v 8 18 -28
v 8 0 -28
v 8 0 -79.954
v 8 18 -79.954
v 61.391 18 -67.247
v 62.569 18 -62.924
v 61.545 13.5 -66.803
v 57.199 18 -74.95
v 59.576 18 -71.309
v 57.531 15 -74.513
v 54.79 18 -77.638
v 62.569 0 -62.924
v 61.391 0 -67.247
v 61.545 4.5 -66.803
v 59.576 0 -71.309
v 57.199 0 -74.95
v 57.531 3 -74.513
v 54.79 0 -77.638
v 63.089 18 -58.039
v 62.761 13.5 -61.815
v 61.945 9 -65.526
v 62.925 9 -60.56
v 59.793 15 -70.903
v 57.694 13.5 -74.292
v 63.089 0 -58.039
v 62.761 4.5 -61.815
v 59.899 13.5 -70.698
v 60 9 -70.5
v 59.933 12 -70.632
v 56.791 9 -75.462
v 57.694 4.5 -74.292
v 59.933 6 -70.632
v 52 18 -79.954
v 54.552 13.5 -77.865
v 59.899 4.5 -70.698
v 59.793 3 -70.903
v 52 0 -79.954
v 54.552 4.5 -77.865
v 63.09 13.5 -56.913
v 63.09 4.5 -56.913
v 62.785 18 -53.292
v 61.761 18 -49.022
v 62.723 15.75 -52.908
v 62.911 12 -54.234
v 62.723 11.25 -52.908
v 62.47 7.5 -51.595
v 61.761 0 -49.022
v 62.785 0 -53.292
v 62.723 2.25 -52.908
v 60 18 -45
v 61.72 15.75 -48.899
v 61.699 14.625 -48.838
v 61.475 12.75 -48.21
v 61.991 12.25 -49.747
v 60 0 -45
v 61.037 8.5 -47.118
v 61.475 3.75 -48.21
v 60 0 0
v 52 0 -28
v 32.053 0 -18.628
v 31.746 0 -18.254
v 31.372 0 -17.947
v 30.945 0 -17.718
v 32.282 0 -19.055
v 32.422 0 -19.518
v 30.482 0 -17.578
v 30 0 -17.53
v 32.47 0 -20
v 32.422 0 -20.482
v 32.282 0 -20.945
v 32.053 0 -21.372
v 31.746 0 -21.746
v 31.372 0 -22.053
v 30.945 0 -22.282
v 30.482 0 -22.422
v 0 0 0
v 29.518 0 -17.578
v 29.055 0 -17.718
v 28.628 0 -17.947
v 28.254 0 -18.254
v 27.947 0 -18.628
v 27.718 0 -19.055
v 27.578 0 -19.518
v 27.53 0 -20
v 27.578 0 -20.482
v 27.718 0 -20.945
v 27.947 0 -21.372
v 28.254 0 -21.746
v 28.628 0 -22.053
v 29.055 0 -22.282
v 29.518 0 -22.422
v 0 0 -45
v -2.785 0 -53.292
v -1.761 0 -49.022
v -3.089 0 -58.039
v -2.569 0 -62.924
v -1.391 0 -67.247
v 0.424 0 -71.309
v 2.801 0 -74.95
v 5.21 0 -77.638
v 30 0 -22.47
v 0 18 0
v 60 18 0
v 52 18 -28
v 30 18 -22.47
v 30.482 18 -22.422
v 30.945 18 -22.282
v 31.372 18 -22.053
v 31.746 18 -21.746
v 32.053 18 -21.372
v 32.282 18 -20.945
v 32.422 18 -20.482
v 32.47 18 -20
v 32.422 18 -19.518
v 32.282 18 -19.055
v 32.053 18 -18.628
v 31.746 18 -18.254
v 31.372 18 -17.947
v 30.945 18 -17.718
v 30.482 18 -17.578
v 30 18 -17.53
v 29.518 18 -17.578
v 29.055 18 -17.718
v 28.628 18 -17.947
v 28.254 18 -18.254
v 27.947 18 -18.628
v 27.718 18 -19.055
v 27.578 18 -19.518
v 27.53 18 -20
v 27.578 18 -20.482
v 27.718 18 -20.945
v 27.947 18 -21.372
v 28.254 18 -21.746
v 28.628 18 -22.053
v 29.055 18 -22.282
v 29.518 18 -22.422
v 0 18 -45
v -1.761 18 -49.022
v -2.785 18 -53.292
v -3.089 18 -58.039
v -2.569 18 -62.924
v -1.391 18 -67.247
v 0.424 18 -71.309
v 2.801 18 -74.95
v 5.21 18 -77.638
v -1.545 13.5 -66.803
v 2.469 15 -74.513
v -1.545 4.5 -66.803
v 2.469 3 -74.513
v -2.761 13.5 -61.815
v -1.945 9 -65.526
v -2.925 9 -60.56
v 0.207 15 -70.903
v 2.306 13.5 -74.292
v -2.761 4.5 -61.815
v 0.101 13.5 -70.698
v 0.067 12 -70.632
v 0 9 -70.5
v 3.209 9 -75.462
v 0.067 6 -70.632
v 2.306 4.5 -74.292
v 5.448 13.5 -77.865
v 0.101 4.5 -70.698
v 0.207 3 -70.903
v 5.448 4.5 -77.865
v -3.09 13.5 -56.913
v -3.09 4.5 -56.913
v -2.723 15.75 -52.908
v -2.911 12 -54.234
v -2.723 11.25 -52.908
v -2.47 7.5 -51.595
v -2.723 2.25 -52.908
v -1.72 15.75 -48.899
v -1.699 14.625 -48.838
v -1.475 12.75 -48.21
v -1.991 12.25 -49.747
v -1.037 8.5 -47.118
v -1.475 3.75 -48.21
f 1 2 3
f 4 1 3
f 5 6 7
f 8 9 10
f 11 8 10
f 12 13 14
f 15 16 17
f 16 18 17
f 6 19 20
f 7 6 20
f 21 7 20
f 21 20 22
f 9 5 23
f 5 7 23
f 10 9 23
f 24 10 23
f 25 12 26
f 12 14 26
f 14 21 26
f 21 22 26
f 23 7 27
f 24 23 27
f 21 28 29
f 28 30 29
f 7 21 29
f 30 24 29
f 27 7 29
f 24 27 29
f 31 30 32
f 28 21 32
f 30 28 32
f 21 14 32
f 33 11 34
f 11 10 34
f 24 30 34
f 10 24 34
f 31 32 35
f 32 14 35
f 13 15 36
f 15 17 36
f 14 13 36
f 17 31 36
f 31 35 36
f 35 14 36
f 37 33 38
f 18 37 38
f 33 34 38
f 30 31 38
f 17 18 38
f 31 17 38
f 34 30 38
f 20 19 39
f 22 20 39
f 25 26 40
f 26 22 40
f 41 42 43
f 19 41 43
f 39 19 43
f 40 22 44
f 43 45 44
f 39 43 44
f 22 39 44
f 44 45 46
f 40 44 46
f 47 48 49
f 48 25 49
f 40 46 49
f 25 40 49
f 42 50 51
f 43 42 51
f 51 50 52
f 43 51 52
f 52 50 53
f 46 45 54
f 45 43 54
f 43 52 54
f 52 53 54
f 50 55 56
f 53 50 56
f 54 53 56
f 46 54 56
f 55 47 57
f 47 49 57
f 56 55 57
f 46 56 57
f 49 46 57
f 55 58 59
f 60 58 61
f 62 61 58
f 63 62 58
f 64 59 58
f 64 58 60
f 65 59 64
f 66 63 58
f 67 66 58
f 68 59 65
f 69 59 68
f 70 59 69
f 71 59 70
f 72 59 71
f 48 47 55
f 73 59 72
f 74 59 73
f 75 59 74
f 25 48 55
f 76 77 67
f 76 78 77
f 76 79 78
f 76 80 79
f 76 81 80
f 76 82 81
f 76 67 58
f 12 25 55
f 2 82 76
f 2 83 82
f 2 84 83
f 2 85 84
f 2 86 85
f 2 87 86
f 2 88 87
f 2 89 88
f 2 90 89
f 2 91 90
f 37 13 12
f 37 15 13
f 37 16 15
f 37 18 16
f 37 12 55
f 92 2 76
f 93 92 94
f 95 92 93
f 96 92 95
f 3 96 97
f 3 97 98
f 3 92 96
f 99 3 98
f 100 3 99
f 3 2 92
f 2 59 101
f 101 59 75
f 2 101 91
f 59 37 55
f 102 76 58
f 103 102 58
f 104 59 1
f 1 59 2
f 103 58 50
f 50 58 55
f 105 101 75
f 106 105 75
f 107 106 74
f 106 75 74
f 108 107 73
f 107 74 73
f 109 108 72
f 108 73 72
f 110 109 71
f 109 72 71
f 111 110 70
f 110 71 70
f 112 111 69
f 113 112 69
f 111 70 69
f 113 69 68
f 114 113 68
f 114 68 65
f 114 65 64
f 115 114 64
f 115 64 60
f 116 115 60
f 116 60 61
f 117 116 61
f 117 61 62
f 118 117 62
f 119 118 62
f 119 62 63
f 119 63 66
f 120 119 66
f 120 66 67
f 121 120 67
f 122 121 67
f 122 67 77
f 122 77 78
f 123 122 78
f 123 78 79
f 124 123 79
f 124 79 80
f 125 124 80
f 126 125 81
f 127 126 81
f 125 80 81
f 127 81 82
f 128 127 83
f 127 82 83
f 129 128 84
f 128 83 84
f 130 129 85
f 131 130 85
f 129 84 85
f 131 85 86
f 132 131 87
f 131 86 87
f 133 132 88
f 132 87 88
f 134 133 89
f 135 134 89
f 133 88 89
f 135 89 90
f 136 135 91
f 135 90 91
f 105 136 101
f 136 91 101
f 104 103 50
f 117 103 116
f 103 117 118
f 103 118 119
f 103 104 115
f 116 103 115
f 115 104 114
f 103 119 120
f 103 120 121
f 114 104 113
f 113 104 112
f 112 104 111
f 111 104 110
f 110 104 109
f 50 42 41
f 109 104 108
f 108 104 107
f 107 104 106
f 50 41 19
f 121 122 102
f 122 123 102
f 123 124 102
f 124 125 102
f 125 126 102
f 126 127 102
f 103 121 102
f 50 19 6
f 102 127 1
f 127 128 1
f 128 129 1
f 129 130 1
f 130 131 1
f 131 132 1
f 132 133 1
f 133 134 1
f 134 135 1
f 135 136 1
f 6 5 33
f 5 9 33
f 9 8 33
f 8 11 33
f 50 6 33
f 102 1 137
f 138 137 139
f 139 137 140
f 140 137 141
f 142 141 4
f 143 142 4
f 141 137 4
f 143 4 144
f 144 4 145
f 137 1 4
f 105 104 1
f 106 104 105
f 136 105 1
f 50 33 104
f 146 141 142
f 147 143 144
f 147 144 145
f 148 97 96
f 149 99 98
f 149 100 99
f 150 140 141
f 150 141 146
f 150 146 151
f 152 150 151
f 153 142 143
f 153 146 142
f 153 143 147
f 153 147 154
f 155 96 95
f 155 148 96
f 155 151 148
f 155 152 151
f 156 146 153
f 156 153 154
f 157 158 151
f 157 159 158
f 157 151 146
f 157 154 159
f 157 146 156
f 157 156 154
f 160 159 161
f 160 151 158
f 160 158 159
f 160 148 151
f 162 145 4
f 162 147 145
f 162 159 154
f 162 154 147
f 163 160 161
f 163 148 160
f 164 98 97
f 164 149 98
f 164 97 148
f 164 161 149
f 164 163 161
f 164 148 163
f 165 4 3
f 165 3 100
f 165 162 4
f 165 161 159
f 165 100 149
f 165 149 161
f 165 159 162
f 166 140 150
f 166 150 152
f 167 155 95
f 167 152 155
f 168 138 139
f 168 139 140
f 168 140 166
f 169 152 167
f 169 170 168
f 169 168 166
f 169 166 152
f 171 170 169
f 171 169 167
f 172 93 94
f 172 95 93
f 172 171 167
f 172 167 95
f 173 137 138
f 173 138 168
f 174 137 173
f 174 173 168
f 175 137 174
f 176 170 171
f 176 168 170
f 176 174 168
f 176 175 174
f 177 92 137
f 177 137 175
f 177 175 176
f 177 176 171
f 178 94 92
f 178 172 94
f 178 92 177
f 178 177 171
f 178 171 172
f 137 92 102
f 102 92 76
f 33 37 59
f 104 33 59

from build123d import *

# Parameters (mm, degrees)
BOSS_EXTRUDE1_DEPTH = 18
SKETCH3_R           = 2.469718116
CUT_EXTRUDE1_DEPTH  = 21


with BuildPart() as part:
    # Sketch1 → Boss-Extrude1 (new body)
    with BuildSketch(Plane(origin=(0, 0, 0), x_dir=(1, 0, 0), z_dir=(0, 1, 0))):
        with BuildLine():
            Line((8, 67.50149873), (8, 79.954057008))
            add(Edge.make_bspline(
                [(0, 45), (-4.267413412, 52.702157849), (-3.849710429, 67.232110416), (4.572220088, 77.524864833), (8, 79.954057008)],
                knots=[0, 0, 0, 0, 0.616858973, 0.90735247, 0.90735247, 0.90735247, 0.90735247], degree=3))
            Line((0, 45), (0, 28))
            Line((0, 28), (0, 0))
            Line((0, 0), (60, 0))
            Line((60, 0), (60, 28))
            Line((60, 28), (60, 45))
            add(Edge.make_bspline(
                [(60, 45), (64.267413412, 52.702157849), (63.849710429, 67.232110416), (55.427779912, 77.524864833), (52, 79.954057008)],
                knots=[0, 0, 0, 0, 0.616858973, 0.90735247, 0.90735247, 0.90735247, 0.90735247], degree=3))
            Line((52, 79.954057008), (52, 70.29729534))
            Line((52, 70.29729534), (52, 28))
            Line((52, 28), (8, 28))
            Line((8, 28), (8, 67.50149873))
        make_face()
    extrude(amount=BOSS_EXTRUDE1_DEPTH)

    # Sketch3 → Cut-Extrude1 (cut)
    with BuildSketch(Plane.XZ):
        with Locations(Location((30, -20, 0), (0, 0, 270))):
            Circle(SKETCH3_R)
    extrude(amount=-CUT_EXTRUDE1_DEPTH, mode=Mode.SUBTRACT)


solid = part.part
